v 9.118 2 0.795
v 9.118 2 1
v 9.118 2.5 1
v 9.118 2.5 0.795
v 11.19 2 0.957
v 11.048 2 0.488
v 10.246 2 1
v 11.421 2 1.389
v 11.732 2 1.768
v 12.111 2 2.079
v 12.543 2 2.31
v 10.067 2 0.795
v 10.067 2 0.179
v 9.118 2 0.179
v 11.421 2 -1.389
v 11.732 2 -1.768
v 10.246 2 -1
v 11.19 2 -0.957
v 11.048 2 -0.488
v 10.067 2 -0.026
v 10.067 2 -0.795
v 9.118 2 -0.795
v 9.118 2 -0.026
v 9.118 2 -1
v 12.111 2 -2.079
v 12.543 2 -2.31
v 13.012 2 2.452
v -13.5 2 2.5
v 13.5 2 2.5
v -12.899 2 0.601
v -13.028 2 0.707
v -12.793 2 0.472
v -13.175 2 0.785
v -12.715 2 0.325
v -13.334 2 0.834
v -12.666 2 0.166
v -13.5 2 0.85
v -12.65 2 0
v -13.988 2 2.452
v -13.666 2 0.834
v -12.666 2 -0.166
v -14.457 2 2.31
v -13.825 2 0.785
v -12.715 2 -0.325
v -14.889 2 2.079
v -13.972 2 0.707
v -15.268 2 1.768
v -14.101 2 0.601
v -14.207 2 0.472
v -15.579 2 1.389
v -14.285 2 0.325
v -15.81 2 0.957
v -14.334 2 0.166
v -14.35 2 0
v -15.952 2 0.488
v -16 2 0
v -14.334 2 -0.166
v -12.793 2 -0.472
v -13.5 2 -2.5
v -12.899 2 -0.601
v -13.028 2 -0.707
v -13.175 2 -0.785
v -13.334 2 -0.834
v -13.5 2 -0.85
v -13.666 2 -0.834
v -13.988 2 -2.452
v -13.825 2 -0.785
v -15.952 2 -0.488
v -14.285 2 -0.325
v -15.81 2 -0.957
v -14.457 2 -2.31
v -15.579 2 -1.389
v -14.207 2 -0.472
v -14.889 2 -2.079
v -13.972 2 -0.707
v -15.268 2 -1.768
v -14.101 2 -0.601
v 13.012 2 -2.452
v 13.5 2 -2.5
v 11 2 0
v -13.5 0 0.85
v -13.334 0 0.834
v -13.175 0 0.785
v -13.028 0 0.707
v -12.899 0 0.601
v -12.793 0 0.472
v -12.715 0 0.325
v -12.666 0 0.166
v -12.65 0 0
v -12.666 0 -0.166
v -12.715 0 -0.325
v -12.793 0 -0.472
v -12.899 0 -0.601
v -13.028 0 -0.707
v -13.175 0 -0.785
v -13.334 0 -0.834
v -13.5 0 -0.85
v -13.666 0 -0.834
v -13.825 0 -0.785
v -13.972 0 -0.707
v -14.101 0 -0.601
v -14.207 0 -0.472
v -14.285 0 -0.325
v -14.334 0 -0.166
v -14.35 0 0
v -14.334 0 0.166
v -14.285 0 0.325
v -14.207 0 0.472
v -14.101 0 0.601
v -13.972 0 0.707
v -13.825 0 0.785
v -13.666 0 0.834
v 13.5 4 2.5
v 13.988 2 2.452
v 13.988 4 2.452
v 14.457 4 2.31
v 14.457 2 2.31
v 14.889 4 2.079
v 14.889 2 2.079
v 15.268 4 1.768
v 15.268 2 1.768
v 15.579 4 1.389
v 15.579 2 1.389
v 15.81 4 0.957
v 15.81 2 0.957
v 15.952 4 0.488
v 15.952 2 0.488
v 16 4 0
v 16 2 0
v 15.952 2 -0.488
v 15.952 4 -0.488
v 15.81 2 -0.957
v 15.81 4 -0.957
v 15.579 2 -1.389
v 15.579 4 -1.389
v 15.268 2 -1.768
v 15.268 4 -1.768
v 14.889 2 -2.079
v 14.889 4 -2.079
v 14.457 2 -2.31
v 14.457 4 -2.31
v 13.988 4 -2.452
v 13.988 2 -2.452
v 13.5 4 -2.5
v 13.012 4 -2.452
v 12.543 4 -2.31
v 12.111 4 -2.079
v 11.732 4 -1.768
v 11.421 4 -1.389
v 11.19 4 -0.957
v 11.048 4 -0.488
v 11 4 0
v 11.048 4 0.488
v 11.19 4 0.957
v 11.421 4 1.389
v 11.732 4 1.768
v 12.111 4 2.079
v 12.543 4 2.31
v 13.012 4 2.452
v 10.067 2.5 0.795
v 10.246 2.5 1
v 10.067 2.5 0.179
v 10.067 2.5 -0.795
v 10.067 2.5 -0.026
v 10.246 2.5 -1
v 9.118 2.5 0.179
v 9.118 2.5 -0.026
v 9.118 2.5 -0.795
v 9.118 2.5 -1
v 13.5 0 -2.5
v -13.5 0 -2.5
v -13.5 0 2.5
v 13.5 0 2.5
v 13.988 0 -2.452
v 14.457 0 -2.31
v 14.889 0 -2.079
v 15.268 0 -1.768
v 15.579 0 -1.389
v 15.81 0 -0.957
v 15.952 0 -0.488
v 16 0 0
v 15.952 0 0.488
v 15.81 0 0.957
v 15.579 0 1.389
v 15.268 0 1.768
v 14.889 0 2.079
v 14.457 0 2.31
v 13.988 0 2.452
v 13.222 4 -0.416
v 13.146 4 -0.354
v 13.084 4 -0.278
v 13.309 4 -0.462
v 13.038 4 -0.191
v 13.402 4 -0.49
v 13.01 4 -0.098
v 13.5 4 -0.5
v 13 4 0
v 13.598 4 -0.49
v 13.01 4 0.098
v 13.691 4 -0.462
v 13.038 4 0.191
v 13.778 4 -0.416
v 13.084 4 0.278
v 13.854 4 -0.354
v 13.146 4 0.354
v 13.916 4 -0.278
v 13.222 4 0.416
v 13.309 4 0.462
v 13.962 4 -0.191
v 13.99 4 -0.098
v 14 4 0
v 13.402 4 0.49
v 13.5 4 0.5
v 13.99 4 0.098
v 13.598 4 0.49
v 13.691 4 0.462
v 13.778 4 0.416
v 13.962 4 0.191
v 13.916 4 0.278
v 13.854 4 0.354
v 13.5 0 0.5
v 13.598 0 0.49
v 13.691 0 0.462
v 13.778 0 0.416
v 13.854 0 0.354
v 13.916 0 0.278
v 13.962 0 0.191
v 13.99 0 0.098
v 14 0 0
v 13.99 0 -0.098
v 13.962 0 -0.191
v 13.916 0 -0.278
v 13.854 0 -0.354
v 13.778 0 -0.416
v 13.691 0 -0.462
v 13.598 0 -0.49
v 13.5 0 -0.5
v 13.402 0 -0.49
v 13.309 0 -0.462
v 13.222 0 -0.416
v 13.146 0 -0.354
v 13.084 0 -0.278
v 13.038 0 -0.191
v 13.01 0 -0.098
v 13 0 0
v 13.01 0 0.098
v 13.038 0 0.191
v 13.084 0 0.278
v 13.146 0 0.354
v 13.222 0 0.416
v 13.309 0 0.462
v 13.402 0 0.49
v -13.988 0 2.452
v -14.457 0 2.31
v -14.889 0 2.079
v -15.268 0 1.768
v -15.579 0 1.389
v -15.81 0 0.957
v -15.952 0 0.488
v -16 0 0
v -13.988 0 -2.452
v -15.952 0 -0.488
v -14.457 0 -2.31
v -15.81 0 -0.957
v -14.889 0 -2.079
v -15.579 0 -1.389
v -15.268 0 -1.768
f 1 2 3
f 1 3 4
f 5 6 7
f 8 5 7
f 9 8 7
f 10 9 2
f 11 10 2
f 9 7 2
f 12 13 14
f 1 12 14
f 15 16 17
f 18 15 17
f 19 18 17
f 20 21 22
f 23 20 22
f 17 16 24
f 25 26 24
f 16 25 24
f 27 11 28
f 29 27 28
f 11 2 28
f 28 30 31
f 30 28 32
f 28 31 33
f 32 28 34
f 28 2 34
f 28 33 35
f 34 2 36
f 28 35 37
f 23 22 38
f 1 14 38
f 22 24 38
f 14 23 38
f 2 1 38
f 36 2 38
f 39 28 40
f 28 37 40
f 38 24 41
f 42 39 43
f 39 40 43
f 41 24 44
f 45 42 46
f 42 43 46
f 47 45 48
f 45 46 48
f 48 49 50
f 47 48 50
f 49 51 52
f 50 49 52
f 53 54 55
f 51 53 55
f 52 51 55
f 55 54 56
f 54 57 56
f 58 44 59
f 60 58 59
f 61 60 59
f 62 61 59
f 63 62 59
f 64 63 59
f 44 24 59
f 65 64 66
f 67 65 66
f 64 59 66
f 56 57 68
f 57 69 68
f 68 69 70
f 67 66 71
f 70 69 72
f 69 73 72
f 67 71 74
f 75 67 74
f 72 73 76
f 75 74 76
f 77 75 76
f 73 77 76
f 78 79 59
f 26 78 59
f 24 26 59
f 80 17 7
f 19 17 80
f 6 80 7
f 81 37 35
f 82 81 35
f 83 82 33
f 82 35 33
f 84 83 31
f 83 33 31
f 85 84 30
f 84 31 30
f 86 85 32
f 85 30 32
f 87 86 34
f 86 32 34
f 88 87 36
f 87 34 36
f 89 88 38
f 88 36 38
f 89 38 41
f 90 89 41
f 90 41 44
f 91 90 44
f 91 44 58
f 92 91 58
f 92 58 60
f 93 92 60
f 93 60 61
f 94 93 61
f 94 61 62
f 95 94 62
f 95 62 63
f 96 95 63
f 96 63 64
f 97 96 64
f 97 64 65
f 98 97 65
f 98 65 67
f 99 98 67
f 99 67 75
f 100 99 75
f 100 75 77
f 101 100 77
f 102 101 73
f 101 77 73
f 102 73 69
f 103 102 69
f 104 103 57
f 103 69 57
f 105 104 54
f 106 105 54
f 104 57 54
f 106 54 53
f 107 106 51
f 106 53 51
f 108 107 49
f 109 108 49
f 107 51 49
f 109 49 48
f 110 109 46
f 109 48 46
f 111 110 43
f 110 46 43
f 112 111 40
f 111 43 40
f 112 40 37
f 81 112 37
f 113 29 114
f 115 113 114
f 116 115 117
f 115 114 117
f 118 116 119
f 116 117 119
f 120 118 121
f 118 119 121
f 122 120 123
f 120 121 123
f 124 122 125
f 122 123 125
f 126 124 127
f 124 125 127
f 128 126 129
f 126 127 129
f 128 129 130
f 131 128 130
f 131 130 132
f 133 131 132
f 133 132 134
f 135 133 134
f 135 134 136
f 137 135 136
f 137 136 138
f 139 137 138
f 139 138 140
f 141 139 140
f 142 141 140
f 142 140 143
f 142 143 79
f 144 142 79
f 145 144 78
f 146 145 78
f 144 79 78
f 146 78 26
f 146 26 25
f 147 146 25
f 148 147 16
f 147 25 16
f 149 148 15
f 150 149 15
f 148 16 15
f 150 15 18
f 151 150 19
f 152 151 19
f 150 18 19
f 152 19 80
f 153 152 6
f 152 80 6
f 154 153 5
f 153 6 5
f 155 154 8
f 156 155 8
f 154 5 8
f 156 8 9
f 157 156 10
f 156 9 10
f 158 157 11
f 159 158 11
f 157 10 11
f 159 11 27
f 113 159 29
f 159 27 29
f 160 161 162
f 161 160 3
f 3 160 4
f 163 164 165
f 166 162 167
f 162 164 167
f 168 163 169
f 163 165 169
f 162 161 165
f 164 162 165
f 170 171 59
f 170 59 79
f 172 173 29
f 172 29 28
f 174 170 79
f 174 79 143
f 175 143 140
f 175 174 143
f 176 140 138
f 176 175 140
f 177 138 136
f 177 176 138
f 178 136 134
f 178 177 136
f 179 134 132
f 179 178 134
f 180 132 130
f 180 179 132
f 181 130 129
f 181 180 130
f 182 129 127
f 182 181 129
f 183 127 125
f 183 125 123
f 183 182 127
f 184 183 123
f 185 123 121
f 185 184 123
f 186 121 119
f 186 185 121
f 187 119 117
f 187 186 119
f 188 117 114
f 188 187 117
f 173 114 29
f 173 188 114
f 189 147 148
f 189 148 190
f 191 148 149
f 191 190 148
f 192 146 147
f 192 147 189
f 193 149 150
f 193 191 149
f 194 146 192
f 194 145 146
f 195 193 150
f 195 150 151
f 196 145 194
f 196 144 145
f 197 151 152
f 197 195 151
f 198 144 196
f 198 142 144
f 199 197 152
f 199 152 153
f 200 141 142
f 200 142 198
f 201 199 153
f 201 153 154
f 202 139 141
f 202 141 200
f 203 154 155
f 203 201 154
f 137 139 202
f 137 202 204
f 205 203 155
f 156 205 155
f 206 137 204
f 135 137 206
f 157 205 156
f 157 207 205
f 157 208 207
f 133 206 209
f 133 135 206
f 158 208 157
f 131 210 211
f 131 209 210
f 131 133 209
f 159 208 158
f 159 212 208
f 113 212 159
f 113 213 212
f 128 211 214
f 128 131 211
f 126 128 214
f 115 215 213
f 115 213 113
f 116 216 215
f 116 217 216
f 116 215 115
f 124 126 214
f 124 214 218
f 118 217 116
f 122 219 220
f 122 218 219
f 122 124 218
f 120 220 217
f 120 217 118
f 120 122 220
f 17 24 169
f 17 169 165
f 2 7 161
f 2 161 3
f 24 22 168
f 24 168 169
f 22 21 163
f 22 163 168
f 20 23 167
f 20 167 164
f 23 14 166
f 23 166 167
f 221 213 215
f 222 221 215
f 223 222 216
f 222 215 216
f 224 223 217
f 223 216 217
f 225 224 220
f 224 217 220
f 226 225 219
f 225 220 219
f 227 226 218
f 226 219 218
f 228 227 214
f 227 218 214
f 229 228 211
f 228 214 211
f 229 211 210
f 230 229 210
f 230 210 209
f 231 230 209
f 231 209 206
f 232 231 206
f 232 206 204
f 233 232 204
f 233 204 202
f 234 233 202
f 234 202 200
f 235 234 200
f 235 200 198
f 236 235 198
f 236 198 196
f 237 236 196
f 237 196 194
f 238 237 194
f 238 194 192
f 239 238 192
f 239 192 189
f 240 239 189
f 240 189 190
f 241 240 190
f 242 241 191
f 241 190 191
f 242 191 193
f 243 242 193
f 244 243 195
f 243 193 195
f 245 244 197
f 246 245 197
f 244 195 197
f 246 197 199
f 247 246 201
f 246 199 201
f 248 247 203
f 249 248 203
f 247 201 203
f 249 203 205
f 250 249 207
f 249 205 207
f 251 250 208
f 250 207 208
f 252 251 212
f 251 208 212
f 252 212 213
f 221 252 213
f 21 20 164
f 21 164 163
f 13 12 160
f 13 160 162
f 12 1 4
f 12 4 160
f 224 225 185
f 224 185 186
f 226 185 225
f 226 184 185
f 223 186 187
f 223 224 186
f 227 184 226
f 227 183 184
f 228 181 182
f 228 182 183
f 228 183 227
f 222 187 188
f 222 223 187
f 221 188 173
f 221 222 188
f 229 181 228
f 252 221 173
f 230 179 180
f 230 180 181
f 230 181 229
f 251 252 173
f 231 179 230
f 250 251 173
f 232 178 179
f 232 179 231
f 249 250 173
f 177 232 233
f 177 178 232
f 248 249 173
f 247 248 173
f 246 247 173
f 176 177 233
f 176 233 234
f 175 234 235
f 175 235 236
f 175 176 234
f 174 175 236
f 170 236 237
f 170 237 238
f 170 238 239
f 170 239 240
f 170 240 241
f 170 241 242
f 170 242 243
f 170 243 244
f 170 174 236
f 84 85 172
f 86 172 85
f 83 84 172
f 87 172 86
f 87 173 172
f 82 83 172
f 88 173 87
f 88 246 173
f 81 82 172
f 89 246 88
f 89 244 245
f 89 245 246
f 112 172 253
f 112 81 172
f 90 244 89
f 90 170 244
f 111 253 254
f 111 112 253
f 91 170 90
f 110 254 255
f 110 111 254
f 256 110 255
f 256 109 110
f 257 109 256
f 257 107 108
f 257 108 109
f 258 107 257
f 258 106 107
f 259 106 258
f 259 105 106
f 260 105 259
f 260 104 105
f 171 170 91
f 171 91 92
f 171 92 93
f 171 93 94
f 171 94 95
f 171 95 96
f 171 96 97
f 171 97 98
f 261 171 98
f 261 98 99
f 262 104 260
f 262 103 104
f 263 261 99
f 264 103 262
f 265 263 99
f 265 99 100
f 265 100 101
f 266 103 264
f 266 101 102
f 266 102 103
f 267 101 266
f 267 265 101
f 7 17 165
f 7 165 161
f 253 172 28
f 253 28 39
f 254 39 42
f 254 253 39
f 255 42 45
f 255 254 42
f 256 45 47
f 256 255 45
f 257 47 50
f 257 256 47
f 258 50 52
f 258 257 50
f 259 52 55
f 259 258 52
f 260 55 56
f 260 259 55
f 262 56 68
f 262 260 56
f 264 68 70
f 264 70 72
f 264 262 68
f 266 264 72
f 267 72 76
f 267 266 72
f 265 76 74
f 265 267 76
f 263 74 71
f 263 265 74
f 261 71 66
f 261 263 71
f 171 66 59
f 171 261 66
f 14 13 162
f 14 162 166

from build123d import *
from build123d.topology import SkipClean

# Parameters (mm, degrees)
RESSALTO_EXTRUS_O1_DEPTH = 2
ESBO_O2_R                = 0.85
CORTE_EXTRUS_O1_DEPTH    = 17.317168872
ESBO_O4_R                = 2.5
RESSALTO_EXTRUS_O2_DEPTH = 2
CORTE_EXTRUS_O2_REACH    = 18.681
ESBO_O3_R                = 0.5
RESSALTO_EXTRUS_O3_DEPTH = 0.5


with BuildPart() as part:
    # Esboço1 → Ressalto-extrusão1 (new body)
    with BuildSketch(Plane(origin=(0, 0, 0), x_dir=(1, 0, 0), z_dir=(0, 1, 0))):
        with BuildLine():
            Line((-13.5, 2.5), (13.5, 2.5))
            ThreePointArc((13.5, 2.5), (16, 0), (13.5, -2.5))
            Line((13.5, -2.5), (-13.5, -2.5))
            ThreePointArc((-13.5, -2.5), (-16, 0), (-13.5, 2.5))
        make_face()
    extrude(amount=RESSALTO_EXTRUS_O1_DEPTH)

    # Esboço2 → Corte-extrusão1 (cut, through all)
    with BuildSketch(Plane(origin=(0, 2, 0), x_dir=(1, 0, 0), z_dir=(0, 1, 0))):
        with Locations((-13.5, 0)):
            Circle(ESBO_O2_R)
    extrude(amount=-CORTE_EXTRUS_O1_DEPTH, mode=Mode.SUBTRACT)

    # Esboço4 → Ressalto-extrusão2 (add)
    with SkipClean():  # the faces are left unmerged after this step: merging them gives an invalid solid
        with BuildSketch(Plane(origin=(0, 2, 0), x_dir=(1, 0, 0), z_dir=(0, 1, 0))):
            with Locations((13.5, 0)):
                Circle(ESBO_O4_R)
        extrude(amount=RESSALTO_EXTRUS_O2_DEPTH)
    add(part.part.scale(1), mode=Mode.REPLACE)  # the faces are merged on a copy

    # Esboço3 → Corte-extrusão2 (cut, up to next)
    with BuildSketch(Plane(origin=(0, 4, 0), x_dir=(1, 0, 0), z_dir=(0, 1, 0)), mode=Mode.PRIVATE) as corte_extrus_o2_sk1:
        with Locations((13.5, 0)):
            Circle(ESBO_O3_R)
    corte_extrus_o2_tool1 = extrude(corte_extrus_o2_sk1.sketch, amount=-CORTE_EXTRUS_O2_REACH, mode=Mode.PRIVATE) & part.part
    add(corte_extrus_o2_tool1.solids().sort_by_distance((13.5, 4, 0))[0], mode=Mode.SUBTRACT)

    # Esboço5 → Ressalto-extrusão3 (add)
    with BuildSketch(Plane(origin=(0, 2, 0), x_dir=(1, 0, 0), z_dir=(0, 1, 0))):
        Polygon((10.246141944, -1), (9.117936815, -1), (9.117936815, -0.794871795), (10.066654764, -0.794871795), (10.066654764, -0.179487179), (9.117936815, -0.179487179), (9.117936815, 0.025641026), (10.066654764, 0.025641026), (10.066654764, 0.794871795), (9.117936815, 0.794871795), (9.117936815, 1), (10.246141944, 1), align=None)
    extrude(amount=RESSALTO_EXTRUS_O3_DEPTH)


solid = part.part
